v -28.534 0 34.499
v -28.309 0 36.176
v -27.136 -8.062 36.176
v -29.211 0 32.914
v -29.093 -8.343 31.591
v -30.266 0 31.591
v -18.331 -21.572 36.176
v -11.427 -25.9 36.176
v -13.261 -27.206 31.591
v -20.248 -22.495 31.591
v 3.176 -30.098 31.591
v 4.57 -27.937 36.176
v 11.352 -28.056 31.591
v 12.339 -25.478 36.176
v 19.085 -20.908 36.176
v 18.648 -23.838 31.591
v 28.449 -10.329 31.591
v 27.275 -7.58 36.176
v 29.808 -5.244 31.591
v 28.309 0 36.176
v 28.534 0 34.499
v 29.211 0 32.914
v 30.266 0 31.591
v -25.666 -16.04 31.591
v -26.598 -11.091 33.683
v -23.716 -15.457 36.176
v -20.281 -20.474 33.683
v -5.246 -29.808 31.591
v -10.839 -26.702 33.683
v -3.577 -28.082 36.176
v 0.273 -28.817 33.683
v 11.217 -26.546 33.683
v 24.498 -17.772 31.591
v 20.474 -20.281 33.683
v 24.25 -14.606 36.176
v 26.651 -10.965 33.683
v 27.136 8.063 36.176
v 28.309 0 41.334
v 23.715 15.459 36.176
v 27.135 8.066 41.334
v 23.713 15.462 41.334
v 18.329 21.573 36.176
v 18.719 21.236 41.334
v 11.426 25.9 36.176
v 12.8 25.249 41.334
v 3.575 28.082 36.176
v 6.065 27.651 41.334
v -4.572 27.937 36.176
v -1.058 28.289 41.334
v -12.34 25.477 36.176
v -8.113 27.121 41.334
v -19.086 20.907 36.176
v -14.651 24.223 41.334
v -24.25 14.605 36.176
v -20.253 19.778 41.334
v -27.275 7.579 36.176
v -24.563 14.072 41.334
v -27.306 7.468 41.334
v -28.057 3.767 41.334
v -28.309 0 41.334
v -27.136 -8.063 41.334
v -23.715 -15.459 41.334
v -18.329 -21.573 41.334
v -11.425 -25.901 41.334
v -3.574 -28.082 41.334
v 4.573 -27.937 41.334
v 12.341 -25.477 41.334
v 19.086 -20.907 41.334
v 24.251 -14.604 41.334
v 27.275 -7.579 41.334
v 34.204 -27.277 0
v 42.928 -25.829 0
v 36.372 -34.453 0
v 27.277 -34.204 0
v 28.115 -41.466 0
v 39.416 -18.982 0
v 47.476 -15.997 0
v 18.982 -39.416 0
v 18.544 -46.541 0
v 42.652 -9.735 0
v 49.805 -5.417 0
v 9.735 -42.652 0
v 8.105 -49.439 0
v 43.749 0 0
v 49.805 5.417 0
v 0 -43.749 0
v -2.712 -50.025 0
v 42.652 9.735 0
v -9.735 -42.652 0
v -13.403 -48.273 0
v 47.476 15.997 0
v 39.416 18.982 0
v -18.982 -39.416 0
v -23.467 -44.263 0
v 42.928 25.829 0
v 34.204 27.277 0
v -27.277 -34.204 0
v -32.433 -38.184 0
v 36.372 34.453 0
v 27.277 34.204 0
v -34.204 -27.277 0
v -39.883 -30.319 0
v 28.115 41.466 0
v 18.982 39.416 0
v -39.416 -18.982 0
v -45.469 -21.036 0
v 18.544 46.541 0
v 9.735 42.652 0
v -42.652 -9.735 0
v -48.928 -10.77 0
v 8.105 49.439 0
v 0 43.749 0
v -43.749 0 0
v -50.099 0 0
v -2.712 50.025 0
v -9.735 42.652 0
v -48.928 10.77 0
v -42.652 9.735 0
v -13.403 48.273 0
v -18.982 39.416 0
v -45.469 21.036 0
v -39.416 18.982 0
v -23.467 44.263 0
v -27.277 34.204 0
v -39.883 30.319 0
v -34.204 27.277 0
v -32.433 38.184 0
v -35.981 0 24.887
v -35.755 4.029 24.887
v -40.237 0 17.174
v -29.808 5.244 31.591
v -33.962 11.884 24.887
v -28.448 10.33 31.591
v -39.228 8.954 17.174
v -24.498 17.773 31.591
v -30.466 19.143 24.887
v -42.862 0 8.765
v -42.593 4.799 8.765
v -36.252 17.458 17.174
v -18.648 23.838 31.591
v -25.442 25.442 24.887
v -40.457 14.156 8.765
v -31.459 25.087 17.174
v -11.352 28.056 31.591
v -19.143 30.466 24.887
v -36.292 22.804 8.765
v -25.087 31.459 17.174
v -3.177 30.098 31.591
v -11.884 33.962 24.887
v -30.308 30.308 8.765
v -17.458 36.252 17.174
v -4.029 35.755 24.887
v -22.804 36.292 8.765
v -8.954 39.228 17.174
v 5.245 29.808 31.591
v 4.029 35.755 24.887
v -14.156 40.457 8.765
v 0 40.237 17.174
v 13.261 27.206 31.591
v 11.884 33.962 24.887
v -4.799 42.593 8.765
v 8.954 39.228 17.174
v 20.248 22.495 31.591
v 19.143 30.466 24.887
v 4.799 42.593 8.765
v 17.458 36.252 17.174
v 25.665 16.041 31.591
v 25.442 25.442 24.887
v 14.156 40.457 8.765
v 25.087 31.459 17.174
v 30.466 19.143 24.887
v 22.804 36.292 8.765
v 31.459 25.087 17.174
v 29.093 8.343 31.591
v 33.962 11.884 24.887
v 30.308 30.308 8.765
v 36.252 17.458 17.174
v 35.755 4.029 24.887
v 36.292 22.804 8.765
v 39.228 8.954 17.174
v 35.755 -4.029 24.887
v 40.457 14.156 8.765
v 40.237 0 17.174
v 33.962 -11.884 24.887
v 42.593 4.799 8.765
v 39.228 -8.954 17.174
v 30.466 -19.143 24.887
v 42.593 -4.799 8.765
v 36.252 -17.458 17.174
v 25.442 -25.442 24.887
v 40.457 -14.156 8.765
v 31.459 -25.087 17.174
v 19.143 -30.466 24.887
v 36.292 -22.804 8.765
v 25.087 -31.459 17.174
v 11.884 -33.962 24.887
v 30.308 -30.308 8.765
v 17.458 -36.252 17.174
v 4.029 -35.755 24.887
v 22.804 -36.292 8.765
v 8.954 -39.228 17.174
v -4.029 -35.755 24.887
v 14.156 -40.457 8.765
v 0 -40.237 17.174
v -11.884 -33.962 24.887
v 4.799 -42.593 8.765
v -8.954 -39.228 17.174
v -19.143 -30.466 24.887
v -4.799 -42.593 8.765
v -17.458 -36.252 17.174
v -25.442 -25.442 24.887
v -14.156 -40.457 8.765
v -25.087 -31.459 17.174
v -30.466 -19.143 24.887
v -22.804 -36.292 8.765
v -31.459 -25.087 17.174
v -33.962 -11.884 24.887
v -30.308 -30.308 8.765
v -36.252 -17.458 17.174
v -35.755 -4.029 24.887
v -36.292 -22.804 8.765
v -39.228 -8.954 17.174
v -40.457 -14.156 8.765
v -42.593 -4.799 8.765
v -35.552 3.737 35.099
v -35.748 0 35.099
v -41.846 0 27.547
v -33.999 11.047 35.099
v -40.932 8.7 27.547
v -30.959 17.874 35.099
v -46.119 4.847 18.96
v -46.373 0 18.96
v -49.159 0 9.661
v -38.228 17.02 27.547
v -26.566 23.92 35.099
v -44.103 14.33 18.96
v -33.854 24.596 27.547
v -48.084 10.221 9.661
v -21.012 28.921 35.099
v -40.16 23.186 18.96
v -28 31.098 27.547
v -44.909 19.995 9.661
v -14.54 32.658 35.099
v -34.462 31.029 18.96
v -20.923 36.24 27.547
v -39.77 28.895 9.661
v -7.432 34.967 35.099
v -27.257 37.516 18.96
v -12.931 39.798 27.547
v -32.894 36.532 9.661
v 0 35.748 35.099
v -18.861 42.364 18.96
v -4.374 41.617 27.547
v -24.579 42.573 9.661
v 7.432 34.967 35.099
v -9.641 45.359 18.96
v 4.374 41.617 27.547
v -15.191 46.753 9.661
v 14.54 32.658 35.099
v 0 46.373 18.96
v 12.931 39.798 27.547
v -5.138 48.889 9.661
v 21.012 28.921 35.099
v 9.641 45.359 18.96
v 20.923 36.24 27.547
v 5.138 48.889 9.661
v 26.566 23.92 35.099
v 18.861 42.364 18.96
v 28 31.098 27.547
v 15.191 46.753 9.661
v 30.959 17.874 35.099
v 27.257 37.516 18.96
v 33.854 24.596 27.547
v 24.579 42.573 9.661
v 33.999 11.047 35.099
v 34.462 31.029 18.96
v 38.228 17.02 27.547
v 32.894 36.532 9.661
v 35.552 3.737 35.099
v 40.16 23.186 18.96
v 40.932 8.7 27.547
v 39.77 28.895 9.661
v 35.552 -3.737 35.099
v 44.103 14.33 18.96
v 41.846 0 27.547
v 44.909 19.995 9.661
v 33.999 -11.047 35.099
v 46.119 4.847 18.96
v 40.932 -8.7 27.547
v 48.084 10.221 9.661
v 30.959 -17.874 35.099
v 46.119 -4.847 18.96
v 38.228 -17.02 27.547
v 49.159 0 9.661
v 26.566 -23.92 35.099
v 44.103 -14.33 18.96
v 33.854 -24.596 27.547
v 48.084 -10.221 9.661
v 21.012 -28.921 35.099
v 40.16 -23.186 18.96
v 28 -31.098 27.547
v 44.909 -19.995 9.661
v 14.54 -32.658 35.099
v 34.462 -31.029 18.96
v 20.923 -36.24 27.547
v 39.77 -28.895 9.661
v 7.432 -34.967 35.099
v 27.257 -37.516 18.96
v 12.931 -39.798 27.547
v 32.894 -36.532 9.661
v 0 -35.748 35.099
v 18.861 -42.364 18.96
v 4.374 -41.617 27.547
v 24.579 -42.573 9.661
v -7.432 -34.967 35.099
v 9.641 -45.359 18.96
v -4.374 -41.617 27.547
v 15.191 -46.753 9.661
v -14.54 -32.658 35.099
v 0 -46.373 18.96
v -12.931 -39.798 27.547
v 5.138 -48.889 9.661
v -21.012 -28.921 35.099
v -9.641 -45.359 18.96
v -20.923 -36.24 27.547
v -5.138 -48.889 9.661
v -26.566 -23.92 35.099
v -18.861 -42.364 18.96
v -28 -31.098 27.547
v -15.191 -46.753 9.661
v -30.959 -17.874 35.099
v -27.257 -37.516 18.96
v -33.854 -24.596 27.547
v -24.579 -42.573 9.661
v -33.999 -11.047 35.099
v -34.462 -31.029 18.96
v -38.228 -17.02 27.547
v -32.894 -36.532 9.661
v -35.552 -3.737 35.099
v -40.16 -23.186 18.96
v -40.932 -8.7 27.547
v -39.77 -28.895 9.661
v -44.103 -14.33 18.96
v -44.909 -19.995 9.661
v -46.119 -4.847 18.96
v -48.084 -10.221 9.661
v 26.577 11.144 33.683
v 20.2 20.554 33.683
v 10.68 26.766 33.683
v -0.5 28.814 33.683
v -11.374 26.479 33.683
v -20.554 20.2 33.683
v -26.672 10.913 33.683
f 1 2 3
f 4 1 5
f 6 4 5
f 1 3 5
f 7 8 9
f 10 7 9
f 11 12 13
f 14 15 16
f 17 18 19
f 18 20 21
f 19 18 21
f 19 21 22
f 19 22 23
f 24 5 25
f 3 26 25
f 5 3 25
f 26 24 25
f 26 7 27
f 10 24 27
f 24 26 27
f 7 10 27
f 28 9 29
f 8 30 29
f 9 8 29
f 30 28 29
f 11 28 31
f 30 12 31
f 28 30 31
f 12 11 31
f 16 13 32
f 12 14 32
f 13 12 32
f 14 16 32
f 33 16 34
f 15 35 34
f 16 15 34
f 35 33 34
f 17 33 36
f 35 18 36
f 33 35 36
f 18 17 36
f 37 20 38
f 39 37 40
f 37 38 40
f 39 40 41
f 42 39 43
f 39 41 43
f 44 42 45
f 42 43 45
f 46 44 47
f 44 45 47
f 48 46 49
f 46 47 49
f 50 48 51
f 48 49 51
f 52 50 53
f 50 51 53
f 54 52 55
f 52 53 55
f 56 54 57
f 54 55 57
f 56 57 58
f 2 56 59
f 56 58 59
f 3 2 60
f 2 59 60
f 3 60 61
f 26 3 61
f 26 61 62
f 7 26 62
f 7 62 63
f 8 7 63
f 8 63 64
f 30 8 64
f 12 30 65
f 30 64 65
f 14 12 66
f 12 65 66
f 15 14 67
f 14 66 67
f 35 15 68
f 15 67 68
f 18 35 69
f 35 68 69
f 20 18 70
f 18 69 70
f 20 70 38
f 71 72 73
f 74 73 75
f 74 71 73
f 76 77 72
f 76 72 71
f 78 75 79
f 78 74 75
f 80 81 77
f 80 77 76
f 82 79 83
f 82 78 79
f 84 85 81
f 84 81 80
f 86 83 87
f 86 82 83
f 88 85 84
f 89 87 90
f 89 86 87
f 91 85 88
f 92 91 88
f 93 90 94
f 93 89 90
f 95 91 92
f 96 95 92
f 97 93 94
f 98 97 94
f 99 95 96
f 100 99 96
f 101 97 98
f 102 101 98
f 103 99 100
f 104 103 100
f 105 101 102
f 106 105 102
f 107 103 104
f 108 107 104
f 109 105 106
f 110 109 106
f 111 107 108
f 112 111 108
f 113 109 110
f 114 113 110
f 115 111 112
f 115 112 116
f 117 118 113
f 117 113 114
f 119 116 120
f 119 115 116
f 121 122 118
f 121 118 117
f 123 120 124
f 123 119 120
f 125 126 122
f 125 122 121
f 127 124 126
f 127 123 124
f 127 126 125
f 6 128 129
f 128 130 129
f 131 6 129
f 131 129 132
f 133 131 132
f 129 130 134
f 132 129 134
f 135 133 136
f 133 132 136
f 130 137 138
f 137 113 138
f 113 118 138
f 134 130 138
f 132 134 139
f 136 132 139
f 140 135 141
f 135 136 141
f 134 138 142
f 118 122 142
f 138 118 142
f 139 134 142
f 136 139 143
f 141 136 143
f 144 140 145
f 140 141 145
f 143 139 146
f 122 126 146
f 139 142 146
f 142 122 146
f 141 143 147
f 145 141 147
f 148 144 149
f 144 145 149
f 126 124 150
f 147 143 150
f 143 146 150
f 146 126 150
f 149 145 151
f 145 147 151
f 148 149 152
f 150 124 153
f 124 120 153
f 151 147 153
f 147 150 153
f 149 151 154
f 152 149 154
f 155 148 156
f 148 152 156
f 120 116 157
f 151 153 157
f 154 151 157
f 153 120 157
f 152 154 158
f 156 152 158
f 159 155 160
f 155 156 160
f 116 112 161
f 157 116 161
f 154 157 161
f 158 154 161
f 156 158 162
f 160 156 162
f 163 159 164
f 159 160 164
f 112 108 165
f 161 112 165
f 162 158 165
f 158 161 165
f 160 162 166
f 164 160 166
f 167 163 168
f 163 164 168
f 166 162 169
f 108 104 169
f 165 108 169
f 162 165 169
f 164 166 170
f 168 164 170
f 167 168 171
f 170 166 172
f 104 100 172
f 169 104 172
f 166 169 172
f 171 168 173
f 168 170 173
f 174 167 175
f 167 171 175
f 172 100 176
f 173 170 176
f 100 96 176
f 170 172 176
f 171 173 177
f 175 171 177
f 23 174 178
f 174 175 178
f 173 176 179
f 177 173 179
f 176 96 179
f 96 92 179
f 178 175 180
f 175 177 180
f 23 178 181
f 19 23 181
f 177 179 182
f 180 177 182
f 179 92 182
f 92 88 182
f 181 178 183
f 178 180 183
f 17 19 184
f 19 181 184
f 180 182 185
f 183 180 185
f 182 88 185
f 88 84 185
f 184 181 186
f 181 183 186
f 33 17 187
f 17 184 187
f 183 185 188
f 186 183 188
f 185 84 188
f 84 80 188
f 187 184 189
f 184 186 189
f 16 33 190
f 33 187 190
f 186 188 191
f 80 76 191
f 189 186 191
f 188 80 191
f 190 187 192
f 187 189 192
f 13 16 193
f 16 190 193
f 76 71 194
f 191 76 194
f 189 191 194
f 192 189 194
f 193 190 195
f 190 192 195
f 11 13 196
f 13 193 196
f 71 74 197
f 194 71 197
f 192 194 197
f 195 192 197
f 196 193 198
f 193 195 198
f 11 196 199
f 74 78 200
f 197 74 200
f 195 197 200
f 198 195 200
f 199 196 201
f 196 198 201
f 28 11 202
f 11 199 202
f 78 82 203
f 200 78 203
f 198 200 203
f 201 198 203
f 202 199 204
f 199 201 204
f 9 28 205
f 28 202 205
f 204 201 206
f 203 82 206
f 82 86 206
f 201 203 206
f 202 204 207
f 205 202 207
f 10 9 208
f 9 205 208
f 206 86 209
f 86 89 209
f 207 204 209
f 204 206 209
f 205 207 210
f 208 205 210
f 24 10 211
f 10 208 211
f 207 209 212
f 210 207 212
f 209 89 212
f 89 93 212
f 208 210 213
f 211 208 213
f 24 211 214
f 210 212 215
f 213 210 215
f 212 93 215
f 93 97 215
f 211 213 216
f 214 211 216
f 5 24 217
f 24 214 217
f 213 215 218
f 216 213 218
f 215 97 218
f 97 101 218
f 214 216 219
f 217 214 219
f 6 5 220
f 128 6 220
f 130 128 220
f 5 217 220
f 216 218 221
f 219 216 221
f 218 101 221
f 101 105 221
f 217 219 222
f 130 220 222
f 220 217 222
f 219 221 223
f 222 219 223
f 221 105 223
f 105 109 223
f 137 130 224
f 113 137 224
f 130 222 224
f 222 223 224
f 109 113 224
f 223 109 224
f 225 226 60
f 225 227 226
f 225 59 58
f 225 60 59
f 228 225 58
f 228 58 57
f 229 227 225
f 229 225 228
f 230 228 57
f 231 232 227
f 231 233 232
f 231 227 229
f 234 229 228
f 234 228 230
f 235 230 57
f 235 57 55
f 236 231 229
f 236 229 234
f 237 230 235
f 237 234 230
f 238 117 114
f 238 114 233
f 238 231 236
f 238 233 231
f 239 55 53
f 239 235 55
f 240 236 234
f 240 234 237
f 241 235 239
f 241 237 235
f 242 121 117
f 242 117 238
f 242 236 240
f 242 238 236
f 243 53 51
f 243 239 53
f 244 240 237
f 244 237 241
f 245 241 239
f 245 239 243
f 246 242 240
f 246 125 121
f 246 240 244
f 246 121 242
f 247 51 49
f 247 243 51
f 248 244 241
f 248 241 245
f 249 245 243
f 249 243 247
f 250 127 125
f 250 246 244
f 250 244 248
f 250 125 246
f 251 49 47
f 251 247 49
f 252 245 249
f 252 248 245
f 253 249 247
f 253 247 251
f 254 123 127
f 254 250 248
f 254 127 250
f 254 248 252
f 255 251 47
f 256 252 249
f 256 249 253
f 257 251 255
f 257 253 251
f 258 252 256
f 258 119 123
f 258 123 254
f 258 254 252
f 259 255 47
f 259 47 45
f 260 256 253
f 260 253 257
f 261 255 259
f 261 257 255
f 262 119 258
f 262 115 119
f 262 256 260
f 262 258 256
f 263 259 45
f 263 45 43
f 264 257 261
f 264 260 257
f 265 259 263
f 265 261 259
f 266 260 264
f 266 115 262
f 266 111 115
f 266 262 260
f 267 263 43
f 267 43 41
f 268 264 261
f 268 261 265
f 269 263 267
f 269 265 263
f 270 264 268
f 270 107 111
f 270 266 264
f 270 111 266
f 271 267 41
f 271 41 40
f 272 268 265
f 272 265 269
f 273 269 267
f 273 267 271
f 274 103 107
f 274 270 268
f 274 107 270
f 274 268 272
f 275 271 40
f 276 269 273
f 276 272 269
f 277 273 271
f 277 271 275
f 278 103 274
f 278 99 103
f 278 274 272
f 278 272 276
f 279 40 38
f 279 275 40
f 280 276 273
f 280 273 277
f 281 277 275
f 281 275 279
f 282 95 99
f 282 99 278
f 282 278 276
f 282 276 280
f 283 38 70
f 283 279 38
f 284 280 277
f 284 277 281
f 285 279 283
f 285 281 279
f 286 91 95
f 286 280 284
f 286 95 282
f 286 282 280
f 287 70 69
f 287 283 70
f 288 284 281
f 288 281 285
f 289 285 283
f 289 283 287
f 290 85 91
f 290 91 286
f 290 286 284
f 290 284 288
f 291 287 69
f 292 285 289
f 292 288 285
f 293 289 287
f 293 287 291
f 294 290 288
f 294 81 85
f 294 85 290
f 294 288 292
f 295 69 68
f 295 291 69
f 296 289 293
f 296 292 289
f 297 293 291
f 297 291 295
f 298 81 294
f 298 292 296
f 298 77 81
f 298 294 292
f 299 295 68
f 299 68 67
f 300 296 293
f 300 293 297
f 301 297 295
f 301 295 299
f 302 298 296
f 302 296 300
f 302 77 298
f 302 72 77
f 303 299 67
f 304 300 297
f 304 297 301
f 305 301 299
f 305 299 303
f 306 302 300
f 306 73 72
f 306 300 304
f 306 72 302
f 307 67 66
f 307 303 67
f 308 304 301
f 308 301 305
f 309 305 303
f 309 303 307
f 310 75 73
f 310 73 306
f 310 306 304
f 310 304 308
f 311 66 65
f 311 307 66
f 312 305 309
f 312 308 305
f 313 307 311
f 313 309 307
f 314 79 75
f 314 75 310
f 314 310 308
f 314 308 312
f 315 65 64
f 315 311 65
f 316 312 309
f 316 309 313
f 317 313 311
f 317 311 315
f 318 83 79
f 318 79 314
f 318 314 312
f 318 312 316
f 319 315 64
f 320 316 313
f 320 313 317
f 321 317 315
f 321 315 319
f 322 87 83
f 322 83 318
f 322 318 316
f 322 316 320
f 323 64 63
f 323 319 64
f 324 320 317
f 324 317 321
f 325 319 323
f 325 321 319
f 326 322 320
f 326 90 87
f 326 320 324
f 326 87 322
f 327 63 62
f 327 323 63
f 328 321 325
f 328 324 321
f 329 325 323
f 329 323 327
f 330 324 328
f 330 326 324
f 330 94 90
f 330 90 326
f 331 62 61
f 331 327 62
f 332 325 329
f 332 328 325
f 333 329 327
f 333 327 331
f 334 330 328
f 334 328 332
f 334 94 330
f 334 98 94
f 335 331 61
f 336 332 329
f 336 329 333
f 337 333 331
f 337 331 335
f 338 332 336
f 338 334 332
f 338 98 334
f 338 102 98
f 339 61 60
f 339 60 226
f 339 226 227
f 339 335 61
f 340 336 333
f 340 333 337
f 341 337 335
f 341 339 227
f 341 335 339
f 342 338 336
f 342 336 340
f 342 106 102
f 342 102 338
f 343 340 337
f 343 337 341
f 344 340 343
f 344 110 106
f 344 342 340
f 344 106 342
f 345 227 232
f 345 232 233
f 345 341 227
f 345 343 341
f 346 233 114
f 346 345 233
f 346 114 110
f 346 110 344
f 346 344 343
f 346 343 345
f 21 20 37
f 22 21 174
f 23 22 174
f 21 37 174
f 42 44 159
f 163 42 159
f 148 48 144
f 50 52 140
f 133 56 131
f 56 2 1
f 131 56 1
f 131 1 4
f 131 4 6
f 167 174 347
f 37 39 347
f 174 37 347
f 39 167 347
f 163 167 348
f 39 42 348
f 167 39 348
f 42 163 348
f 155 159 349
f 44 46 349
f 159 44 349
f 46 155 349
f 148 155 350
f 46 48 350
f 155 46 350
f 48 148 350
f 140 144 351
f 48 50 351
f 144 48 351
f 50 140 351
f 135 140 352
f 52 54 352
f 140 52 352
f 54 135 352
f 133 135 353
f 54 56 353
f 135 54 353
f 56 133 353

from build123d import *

# Parameters (mm, degrees)
F2_T     = -6.35
F4_R     = 28.3085495975
F5_DEPTH = 38.1
F6_R     = 6.35


with BuildPart() as f1:
    # F0 (on Front) → F1 (revolve)
    with BuildSketch(Plane.XZ):
        with BuildLine():
            Line((0, 0), (0, 50.0989693034))
            ThreePointArc((0, 50.0989693034), (-35.4253209249, 35.4253209249), (-50.0989693034, 0))
            Line((-50.0989693034, 0), (0, 0))
        make_face()
    revolve(axis=Axis((0, 0, 10.1562657768), (0, 0, -1)))

    # F2
    f2_openings = [f1.faces().sort_by_distance(p)[0] for p in [
        (0, 0, 0),
    ]]
    offset(amount=F2_T, openings=f2_openings)

    # F4 (on offset) → F5 (cut, symmetric)
    with BuildSketch(Plane.XY.offset(41.275)):
        Circle(F4_R)
    extrude(amount=F5_DEPTH, both=True, mode=Mode.SUBTRACT)

    # F6
    f6_edges = [f1.edges().sort_by_distance(p)[0] for p in [
        (0, -28.30855, 33.355634),
        (0, 28.30855, 33.355634),
    ]]
    fillet(f6_edges, radius=F6_R)


solid = f1.part
